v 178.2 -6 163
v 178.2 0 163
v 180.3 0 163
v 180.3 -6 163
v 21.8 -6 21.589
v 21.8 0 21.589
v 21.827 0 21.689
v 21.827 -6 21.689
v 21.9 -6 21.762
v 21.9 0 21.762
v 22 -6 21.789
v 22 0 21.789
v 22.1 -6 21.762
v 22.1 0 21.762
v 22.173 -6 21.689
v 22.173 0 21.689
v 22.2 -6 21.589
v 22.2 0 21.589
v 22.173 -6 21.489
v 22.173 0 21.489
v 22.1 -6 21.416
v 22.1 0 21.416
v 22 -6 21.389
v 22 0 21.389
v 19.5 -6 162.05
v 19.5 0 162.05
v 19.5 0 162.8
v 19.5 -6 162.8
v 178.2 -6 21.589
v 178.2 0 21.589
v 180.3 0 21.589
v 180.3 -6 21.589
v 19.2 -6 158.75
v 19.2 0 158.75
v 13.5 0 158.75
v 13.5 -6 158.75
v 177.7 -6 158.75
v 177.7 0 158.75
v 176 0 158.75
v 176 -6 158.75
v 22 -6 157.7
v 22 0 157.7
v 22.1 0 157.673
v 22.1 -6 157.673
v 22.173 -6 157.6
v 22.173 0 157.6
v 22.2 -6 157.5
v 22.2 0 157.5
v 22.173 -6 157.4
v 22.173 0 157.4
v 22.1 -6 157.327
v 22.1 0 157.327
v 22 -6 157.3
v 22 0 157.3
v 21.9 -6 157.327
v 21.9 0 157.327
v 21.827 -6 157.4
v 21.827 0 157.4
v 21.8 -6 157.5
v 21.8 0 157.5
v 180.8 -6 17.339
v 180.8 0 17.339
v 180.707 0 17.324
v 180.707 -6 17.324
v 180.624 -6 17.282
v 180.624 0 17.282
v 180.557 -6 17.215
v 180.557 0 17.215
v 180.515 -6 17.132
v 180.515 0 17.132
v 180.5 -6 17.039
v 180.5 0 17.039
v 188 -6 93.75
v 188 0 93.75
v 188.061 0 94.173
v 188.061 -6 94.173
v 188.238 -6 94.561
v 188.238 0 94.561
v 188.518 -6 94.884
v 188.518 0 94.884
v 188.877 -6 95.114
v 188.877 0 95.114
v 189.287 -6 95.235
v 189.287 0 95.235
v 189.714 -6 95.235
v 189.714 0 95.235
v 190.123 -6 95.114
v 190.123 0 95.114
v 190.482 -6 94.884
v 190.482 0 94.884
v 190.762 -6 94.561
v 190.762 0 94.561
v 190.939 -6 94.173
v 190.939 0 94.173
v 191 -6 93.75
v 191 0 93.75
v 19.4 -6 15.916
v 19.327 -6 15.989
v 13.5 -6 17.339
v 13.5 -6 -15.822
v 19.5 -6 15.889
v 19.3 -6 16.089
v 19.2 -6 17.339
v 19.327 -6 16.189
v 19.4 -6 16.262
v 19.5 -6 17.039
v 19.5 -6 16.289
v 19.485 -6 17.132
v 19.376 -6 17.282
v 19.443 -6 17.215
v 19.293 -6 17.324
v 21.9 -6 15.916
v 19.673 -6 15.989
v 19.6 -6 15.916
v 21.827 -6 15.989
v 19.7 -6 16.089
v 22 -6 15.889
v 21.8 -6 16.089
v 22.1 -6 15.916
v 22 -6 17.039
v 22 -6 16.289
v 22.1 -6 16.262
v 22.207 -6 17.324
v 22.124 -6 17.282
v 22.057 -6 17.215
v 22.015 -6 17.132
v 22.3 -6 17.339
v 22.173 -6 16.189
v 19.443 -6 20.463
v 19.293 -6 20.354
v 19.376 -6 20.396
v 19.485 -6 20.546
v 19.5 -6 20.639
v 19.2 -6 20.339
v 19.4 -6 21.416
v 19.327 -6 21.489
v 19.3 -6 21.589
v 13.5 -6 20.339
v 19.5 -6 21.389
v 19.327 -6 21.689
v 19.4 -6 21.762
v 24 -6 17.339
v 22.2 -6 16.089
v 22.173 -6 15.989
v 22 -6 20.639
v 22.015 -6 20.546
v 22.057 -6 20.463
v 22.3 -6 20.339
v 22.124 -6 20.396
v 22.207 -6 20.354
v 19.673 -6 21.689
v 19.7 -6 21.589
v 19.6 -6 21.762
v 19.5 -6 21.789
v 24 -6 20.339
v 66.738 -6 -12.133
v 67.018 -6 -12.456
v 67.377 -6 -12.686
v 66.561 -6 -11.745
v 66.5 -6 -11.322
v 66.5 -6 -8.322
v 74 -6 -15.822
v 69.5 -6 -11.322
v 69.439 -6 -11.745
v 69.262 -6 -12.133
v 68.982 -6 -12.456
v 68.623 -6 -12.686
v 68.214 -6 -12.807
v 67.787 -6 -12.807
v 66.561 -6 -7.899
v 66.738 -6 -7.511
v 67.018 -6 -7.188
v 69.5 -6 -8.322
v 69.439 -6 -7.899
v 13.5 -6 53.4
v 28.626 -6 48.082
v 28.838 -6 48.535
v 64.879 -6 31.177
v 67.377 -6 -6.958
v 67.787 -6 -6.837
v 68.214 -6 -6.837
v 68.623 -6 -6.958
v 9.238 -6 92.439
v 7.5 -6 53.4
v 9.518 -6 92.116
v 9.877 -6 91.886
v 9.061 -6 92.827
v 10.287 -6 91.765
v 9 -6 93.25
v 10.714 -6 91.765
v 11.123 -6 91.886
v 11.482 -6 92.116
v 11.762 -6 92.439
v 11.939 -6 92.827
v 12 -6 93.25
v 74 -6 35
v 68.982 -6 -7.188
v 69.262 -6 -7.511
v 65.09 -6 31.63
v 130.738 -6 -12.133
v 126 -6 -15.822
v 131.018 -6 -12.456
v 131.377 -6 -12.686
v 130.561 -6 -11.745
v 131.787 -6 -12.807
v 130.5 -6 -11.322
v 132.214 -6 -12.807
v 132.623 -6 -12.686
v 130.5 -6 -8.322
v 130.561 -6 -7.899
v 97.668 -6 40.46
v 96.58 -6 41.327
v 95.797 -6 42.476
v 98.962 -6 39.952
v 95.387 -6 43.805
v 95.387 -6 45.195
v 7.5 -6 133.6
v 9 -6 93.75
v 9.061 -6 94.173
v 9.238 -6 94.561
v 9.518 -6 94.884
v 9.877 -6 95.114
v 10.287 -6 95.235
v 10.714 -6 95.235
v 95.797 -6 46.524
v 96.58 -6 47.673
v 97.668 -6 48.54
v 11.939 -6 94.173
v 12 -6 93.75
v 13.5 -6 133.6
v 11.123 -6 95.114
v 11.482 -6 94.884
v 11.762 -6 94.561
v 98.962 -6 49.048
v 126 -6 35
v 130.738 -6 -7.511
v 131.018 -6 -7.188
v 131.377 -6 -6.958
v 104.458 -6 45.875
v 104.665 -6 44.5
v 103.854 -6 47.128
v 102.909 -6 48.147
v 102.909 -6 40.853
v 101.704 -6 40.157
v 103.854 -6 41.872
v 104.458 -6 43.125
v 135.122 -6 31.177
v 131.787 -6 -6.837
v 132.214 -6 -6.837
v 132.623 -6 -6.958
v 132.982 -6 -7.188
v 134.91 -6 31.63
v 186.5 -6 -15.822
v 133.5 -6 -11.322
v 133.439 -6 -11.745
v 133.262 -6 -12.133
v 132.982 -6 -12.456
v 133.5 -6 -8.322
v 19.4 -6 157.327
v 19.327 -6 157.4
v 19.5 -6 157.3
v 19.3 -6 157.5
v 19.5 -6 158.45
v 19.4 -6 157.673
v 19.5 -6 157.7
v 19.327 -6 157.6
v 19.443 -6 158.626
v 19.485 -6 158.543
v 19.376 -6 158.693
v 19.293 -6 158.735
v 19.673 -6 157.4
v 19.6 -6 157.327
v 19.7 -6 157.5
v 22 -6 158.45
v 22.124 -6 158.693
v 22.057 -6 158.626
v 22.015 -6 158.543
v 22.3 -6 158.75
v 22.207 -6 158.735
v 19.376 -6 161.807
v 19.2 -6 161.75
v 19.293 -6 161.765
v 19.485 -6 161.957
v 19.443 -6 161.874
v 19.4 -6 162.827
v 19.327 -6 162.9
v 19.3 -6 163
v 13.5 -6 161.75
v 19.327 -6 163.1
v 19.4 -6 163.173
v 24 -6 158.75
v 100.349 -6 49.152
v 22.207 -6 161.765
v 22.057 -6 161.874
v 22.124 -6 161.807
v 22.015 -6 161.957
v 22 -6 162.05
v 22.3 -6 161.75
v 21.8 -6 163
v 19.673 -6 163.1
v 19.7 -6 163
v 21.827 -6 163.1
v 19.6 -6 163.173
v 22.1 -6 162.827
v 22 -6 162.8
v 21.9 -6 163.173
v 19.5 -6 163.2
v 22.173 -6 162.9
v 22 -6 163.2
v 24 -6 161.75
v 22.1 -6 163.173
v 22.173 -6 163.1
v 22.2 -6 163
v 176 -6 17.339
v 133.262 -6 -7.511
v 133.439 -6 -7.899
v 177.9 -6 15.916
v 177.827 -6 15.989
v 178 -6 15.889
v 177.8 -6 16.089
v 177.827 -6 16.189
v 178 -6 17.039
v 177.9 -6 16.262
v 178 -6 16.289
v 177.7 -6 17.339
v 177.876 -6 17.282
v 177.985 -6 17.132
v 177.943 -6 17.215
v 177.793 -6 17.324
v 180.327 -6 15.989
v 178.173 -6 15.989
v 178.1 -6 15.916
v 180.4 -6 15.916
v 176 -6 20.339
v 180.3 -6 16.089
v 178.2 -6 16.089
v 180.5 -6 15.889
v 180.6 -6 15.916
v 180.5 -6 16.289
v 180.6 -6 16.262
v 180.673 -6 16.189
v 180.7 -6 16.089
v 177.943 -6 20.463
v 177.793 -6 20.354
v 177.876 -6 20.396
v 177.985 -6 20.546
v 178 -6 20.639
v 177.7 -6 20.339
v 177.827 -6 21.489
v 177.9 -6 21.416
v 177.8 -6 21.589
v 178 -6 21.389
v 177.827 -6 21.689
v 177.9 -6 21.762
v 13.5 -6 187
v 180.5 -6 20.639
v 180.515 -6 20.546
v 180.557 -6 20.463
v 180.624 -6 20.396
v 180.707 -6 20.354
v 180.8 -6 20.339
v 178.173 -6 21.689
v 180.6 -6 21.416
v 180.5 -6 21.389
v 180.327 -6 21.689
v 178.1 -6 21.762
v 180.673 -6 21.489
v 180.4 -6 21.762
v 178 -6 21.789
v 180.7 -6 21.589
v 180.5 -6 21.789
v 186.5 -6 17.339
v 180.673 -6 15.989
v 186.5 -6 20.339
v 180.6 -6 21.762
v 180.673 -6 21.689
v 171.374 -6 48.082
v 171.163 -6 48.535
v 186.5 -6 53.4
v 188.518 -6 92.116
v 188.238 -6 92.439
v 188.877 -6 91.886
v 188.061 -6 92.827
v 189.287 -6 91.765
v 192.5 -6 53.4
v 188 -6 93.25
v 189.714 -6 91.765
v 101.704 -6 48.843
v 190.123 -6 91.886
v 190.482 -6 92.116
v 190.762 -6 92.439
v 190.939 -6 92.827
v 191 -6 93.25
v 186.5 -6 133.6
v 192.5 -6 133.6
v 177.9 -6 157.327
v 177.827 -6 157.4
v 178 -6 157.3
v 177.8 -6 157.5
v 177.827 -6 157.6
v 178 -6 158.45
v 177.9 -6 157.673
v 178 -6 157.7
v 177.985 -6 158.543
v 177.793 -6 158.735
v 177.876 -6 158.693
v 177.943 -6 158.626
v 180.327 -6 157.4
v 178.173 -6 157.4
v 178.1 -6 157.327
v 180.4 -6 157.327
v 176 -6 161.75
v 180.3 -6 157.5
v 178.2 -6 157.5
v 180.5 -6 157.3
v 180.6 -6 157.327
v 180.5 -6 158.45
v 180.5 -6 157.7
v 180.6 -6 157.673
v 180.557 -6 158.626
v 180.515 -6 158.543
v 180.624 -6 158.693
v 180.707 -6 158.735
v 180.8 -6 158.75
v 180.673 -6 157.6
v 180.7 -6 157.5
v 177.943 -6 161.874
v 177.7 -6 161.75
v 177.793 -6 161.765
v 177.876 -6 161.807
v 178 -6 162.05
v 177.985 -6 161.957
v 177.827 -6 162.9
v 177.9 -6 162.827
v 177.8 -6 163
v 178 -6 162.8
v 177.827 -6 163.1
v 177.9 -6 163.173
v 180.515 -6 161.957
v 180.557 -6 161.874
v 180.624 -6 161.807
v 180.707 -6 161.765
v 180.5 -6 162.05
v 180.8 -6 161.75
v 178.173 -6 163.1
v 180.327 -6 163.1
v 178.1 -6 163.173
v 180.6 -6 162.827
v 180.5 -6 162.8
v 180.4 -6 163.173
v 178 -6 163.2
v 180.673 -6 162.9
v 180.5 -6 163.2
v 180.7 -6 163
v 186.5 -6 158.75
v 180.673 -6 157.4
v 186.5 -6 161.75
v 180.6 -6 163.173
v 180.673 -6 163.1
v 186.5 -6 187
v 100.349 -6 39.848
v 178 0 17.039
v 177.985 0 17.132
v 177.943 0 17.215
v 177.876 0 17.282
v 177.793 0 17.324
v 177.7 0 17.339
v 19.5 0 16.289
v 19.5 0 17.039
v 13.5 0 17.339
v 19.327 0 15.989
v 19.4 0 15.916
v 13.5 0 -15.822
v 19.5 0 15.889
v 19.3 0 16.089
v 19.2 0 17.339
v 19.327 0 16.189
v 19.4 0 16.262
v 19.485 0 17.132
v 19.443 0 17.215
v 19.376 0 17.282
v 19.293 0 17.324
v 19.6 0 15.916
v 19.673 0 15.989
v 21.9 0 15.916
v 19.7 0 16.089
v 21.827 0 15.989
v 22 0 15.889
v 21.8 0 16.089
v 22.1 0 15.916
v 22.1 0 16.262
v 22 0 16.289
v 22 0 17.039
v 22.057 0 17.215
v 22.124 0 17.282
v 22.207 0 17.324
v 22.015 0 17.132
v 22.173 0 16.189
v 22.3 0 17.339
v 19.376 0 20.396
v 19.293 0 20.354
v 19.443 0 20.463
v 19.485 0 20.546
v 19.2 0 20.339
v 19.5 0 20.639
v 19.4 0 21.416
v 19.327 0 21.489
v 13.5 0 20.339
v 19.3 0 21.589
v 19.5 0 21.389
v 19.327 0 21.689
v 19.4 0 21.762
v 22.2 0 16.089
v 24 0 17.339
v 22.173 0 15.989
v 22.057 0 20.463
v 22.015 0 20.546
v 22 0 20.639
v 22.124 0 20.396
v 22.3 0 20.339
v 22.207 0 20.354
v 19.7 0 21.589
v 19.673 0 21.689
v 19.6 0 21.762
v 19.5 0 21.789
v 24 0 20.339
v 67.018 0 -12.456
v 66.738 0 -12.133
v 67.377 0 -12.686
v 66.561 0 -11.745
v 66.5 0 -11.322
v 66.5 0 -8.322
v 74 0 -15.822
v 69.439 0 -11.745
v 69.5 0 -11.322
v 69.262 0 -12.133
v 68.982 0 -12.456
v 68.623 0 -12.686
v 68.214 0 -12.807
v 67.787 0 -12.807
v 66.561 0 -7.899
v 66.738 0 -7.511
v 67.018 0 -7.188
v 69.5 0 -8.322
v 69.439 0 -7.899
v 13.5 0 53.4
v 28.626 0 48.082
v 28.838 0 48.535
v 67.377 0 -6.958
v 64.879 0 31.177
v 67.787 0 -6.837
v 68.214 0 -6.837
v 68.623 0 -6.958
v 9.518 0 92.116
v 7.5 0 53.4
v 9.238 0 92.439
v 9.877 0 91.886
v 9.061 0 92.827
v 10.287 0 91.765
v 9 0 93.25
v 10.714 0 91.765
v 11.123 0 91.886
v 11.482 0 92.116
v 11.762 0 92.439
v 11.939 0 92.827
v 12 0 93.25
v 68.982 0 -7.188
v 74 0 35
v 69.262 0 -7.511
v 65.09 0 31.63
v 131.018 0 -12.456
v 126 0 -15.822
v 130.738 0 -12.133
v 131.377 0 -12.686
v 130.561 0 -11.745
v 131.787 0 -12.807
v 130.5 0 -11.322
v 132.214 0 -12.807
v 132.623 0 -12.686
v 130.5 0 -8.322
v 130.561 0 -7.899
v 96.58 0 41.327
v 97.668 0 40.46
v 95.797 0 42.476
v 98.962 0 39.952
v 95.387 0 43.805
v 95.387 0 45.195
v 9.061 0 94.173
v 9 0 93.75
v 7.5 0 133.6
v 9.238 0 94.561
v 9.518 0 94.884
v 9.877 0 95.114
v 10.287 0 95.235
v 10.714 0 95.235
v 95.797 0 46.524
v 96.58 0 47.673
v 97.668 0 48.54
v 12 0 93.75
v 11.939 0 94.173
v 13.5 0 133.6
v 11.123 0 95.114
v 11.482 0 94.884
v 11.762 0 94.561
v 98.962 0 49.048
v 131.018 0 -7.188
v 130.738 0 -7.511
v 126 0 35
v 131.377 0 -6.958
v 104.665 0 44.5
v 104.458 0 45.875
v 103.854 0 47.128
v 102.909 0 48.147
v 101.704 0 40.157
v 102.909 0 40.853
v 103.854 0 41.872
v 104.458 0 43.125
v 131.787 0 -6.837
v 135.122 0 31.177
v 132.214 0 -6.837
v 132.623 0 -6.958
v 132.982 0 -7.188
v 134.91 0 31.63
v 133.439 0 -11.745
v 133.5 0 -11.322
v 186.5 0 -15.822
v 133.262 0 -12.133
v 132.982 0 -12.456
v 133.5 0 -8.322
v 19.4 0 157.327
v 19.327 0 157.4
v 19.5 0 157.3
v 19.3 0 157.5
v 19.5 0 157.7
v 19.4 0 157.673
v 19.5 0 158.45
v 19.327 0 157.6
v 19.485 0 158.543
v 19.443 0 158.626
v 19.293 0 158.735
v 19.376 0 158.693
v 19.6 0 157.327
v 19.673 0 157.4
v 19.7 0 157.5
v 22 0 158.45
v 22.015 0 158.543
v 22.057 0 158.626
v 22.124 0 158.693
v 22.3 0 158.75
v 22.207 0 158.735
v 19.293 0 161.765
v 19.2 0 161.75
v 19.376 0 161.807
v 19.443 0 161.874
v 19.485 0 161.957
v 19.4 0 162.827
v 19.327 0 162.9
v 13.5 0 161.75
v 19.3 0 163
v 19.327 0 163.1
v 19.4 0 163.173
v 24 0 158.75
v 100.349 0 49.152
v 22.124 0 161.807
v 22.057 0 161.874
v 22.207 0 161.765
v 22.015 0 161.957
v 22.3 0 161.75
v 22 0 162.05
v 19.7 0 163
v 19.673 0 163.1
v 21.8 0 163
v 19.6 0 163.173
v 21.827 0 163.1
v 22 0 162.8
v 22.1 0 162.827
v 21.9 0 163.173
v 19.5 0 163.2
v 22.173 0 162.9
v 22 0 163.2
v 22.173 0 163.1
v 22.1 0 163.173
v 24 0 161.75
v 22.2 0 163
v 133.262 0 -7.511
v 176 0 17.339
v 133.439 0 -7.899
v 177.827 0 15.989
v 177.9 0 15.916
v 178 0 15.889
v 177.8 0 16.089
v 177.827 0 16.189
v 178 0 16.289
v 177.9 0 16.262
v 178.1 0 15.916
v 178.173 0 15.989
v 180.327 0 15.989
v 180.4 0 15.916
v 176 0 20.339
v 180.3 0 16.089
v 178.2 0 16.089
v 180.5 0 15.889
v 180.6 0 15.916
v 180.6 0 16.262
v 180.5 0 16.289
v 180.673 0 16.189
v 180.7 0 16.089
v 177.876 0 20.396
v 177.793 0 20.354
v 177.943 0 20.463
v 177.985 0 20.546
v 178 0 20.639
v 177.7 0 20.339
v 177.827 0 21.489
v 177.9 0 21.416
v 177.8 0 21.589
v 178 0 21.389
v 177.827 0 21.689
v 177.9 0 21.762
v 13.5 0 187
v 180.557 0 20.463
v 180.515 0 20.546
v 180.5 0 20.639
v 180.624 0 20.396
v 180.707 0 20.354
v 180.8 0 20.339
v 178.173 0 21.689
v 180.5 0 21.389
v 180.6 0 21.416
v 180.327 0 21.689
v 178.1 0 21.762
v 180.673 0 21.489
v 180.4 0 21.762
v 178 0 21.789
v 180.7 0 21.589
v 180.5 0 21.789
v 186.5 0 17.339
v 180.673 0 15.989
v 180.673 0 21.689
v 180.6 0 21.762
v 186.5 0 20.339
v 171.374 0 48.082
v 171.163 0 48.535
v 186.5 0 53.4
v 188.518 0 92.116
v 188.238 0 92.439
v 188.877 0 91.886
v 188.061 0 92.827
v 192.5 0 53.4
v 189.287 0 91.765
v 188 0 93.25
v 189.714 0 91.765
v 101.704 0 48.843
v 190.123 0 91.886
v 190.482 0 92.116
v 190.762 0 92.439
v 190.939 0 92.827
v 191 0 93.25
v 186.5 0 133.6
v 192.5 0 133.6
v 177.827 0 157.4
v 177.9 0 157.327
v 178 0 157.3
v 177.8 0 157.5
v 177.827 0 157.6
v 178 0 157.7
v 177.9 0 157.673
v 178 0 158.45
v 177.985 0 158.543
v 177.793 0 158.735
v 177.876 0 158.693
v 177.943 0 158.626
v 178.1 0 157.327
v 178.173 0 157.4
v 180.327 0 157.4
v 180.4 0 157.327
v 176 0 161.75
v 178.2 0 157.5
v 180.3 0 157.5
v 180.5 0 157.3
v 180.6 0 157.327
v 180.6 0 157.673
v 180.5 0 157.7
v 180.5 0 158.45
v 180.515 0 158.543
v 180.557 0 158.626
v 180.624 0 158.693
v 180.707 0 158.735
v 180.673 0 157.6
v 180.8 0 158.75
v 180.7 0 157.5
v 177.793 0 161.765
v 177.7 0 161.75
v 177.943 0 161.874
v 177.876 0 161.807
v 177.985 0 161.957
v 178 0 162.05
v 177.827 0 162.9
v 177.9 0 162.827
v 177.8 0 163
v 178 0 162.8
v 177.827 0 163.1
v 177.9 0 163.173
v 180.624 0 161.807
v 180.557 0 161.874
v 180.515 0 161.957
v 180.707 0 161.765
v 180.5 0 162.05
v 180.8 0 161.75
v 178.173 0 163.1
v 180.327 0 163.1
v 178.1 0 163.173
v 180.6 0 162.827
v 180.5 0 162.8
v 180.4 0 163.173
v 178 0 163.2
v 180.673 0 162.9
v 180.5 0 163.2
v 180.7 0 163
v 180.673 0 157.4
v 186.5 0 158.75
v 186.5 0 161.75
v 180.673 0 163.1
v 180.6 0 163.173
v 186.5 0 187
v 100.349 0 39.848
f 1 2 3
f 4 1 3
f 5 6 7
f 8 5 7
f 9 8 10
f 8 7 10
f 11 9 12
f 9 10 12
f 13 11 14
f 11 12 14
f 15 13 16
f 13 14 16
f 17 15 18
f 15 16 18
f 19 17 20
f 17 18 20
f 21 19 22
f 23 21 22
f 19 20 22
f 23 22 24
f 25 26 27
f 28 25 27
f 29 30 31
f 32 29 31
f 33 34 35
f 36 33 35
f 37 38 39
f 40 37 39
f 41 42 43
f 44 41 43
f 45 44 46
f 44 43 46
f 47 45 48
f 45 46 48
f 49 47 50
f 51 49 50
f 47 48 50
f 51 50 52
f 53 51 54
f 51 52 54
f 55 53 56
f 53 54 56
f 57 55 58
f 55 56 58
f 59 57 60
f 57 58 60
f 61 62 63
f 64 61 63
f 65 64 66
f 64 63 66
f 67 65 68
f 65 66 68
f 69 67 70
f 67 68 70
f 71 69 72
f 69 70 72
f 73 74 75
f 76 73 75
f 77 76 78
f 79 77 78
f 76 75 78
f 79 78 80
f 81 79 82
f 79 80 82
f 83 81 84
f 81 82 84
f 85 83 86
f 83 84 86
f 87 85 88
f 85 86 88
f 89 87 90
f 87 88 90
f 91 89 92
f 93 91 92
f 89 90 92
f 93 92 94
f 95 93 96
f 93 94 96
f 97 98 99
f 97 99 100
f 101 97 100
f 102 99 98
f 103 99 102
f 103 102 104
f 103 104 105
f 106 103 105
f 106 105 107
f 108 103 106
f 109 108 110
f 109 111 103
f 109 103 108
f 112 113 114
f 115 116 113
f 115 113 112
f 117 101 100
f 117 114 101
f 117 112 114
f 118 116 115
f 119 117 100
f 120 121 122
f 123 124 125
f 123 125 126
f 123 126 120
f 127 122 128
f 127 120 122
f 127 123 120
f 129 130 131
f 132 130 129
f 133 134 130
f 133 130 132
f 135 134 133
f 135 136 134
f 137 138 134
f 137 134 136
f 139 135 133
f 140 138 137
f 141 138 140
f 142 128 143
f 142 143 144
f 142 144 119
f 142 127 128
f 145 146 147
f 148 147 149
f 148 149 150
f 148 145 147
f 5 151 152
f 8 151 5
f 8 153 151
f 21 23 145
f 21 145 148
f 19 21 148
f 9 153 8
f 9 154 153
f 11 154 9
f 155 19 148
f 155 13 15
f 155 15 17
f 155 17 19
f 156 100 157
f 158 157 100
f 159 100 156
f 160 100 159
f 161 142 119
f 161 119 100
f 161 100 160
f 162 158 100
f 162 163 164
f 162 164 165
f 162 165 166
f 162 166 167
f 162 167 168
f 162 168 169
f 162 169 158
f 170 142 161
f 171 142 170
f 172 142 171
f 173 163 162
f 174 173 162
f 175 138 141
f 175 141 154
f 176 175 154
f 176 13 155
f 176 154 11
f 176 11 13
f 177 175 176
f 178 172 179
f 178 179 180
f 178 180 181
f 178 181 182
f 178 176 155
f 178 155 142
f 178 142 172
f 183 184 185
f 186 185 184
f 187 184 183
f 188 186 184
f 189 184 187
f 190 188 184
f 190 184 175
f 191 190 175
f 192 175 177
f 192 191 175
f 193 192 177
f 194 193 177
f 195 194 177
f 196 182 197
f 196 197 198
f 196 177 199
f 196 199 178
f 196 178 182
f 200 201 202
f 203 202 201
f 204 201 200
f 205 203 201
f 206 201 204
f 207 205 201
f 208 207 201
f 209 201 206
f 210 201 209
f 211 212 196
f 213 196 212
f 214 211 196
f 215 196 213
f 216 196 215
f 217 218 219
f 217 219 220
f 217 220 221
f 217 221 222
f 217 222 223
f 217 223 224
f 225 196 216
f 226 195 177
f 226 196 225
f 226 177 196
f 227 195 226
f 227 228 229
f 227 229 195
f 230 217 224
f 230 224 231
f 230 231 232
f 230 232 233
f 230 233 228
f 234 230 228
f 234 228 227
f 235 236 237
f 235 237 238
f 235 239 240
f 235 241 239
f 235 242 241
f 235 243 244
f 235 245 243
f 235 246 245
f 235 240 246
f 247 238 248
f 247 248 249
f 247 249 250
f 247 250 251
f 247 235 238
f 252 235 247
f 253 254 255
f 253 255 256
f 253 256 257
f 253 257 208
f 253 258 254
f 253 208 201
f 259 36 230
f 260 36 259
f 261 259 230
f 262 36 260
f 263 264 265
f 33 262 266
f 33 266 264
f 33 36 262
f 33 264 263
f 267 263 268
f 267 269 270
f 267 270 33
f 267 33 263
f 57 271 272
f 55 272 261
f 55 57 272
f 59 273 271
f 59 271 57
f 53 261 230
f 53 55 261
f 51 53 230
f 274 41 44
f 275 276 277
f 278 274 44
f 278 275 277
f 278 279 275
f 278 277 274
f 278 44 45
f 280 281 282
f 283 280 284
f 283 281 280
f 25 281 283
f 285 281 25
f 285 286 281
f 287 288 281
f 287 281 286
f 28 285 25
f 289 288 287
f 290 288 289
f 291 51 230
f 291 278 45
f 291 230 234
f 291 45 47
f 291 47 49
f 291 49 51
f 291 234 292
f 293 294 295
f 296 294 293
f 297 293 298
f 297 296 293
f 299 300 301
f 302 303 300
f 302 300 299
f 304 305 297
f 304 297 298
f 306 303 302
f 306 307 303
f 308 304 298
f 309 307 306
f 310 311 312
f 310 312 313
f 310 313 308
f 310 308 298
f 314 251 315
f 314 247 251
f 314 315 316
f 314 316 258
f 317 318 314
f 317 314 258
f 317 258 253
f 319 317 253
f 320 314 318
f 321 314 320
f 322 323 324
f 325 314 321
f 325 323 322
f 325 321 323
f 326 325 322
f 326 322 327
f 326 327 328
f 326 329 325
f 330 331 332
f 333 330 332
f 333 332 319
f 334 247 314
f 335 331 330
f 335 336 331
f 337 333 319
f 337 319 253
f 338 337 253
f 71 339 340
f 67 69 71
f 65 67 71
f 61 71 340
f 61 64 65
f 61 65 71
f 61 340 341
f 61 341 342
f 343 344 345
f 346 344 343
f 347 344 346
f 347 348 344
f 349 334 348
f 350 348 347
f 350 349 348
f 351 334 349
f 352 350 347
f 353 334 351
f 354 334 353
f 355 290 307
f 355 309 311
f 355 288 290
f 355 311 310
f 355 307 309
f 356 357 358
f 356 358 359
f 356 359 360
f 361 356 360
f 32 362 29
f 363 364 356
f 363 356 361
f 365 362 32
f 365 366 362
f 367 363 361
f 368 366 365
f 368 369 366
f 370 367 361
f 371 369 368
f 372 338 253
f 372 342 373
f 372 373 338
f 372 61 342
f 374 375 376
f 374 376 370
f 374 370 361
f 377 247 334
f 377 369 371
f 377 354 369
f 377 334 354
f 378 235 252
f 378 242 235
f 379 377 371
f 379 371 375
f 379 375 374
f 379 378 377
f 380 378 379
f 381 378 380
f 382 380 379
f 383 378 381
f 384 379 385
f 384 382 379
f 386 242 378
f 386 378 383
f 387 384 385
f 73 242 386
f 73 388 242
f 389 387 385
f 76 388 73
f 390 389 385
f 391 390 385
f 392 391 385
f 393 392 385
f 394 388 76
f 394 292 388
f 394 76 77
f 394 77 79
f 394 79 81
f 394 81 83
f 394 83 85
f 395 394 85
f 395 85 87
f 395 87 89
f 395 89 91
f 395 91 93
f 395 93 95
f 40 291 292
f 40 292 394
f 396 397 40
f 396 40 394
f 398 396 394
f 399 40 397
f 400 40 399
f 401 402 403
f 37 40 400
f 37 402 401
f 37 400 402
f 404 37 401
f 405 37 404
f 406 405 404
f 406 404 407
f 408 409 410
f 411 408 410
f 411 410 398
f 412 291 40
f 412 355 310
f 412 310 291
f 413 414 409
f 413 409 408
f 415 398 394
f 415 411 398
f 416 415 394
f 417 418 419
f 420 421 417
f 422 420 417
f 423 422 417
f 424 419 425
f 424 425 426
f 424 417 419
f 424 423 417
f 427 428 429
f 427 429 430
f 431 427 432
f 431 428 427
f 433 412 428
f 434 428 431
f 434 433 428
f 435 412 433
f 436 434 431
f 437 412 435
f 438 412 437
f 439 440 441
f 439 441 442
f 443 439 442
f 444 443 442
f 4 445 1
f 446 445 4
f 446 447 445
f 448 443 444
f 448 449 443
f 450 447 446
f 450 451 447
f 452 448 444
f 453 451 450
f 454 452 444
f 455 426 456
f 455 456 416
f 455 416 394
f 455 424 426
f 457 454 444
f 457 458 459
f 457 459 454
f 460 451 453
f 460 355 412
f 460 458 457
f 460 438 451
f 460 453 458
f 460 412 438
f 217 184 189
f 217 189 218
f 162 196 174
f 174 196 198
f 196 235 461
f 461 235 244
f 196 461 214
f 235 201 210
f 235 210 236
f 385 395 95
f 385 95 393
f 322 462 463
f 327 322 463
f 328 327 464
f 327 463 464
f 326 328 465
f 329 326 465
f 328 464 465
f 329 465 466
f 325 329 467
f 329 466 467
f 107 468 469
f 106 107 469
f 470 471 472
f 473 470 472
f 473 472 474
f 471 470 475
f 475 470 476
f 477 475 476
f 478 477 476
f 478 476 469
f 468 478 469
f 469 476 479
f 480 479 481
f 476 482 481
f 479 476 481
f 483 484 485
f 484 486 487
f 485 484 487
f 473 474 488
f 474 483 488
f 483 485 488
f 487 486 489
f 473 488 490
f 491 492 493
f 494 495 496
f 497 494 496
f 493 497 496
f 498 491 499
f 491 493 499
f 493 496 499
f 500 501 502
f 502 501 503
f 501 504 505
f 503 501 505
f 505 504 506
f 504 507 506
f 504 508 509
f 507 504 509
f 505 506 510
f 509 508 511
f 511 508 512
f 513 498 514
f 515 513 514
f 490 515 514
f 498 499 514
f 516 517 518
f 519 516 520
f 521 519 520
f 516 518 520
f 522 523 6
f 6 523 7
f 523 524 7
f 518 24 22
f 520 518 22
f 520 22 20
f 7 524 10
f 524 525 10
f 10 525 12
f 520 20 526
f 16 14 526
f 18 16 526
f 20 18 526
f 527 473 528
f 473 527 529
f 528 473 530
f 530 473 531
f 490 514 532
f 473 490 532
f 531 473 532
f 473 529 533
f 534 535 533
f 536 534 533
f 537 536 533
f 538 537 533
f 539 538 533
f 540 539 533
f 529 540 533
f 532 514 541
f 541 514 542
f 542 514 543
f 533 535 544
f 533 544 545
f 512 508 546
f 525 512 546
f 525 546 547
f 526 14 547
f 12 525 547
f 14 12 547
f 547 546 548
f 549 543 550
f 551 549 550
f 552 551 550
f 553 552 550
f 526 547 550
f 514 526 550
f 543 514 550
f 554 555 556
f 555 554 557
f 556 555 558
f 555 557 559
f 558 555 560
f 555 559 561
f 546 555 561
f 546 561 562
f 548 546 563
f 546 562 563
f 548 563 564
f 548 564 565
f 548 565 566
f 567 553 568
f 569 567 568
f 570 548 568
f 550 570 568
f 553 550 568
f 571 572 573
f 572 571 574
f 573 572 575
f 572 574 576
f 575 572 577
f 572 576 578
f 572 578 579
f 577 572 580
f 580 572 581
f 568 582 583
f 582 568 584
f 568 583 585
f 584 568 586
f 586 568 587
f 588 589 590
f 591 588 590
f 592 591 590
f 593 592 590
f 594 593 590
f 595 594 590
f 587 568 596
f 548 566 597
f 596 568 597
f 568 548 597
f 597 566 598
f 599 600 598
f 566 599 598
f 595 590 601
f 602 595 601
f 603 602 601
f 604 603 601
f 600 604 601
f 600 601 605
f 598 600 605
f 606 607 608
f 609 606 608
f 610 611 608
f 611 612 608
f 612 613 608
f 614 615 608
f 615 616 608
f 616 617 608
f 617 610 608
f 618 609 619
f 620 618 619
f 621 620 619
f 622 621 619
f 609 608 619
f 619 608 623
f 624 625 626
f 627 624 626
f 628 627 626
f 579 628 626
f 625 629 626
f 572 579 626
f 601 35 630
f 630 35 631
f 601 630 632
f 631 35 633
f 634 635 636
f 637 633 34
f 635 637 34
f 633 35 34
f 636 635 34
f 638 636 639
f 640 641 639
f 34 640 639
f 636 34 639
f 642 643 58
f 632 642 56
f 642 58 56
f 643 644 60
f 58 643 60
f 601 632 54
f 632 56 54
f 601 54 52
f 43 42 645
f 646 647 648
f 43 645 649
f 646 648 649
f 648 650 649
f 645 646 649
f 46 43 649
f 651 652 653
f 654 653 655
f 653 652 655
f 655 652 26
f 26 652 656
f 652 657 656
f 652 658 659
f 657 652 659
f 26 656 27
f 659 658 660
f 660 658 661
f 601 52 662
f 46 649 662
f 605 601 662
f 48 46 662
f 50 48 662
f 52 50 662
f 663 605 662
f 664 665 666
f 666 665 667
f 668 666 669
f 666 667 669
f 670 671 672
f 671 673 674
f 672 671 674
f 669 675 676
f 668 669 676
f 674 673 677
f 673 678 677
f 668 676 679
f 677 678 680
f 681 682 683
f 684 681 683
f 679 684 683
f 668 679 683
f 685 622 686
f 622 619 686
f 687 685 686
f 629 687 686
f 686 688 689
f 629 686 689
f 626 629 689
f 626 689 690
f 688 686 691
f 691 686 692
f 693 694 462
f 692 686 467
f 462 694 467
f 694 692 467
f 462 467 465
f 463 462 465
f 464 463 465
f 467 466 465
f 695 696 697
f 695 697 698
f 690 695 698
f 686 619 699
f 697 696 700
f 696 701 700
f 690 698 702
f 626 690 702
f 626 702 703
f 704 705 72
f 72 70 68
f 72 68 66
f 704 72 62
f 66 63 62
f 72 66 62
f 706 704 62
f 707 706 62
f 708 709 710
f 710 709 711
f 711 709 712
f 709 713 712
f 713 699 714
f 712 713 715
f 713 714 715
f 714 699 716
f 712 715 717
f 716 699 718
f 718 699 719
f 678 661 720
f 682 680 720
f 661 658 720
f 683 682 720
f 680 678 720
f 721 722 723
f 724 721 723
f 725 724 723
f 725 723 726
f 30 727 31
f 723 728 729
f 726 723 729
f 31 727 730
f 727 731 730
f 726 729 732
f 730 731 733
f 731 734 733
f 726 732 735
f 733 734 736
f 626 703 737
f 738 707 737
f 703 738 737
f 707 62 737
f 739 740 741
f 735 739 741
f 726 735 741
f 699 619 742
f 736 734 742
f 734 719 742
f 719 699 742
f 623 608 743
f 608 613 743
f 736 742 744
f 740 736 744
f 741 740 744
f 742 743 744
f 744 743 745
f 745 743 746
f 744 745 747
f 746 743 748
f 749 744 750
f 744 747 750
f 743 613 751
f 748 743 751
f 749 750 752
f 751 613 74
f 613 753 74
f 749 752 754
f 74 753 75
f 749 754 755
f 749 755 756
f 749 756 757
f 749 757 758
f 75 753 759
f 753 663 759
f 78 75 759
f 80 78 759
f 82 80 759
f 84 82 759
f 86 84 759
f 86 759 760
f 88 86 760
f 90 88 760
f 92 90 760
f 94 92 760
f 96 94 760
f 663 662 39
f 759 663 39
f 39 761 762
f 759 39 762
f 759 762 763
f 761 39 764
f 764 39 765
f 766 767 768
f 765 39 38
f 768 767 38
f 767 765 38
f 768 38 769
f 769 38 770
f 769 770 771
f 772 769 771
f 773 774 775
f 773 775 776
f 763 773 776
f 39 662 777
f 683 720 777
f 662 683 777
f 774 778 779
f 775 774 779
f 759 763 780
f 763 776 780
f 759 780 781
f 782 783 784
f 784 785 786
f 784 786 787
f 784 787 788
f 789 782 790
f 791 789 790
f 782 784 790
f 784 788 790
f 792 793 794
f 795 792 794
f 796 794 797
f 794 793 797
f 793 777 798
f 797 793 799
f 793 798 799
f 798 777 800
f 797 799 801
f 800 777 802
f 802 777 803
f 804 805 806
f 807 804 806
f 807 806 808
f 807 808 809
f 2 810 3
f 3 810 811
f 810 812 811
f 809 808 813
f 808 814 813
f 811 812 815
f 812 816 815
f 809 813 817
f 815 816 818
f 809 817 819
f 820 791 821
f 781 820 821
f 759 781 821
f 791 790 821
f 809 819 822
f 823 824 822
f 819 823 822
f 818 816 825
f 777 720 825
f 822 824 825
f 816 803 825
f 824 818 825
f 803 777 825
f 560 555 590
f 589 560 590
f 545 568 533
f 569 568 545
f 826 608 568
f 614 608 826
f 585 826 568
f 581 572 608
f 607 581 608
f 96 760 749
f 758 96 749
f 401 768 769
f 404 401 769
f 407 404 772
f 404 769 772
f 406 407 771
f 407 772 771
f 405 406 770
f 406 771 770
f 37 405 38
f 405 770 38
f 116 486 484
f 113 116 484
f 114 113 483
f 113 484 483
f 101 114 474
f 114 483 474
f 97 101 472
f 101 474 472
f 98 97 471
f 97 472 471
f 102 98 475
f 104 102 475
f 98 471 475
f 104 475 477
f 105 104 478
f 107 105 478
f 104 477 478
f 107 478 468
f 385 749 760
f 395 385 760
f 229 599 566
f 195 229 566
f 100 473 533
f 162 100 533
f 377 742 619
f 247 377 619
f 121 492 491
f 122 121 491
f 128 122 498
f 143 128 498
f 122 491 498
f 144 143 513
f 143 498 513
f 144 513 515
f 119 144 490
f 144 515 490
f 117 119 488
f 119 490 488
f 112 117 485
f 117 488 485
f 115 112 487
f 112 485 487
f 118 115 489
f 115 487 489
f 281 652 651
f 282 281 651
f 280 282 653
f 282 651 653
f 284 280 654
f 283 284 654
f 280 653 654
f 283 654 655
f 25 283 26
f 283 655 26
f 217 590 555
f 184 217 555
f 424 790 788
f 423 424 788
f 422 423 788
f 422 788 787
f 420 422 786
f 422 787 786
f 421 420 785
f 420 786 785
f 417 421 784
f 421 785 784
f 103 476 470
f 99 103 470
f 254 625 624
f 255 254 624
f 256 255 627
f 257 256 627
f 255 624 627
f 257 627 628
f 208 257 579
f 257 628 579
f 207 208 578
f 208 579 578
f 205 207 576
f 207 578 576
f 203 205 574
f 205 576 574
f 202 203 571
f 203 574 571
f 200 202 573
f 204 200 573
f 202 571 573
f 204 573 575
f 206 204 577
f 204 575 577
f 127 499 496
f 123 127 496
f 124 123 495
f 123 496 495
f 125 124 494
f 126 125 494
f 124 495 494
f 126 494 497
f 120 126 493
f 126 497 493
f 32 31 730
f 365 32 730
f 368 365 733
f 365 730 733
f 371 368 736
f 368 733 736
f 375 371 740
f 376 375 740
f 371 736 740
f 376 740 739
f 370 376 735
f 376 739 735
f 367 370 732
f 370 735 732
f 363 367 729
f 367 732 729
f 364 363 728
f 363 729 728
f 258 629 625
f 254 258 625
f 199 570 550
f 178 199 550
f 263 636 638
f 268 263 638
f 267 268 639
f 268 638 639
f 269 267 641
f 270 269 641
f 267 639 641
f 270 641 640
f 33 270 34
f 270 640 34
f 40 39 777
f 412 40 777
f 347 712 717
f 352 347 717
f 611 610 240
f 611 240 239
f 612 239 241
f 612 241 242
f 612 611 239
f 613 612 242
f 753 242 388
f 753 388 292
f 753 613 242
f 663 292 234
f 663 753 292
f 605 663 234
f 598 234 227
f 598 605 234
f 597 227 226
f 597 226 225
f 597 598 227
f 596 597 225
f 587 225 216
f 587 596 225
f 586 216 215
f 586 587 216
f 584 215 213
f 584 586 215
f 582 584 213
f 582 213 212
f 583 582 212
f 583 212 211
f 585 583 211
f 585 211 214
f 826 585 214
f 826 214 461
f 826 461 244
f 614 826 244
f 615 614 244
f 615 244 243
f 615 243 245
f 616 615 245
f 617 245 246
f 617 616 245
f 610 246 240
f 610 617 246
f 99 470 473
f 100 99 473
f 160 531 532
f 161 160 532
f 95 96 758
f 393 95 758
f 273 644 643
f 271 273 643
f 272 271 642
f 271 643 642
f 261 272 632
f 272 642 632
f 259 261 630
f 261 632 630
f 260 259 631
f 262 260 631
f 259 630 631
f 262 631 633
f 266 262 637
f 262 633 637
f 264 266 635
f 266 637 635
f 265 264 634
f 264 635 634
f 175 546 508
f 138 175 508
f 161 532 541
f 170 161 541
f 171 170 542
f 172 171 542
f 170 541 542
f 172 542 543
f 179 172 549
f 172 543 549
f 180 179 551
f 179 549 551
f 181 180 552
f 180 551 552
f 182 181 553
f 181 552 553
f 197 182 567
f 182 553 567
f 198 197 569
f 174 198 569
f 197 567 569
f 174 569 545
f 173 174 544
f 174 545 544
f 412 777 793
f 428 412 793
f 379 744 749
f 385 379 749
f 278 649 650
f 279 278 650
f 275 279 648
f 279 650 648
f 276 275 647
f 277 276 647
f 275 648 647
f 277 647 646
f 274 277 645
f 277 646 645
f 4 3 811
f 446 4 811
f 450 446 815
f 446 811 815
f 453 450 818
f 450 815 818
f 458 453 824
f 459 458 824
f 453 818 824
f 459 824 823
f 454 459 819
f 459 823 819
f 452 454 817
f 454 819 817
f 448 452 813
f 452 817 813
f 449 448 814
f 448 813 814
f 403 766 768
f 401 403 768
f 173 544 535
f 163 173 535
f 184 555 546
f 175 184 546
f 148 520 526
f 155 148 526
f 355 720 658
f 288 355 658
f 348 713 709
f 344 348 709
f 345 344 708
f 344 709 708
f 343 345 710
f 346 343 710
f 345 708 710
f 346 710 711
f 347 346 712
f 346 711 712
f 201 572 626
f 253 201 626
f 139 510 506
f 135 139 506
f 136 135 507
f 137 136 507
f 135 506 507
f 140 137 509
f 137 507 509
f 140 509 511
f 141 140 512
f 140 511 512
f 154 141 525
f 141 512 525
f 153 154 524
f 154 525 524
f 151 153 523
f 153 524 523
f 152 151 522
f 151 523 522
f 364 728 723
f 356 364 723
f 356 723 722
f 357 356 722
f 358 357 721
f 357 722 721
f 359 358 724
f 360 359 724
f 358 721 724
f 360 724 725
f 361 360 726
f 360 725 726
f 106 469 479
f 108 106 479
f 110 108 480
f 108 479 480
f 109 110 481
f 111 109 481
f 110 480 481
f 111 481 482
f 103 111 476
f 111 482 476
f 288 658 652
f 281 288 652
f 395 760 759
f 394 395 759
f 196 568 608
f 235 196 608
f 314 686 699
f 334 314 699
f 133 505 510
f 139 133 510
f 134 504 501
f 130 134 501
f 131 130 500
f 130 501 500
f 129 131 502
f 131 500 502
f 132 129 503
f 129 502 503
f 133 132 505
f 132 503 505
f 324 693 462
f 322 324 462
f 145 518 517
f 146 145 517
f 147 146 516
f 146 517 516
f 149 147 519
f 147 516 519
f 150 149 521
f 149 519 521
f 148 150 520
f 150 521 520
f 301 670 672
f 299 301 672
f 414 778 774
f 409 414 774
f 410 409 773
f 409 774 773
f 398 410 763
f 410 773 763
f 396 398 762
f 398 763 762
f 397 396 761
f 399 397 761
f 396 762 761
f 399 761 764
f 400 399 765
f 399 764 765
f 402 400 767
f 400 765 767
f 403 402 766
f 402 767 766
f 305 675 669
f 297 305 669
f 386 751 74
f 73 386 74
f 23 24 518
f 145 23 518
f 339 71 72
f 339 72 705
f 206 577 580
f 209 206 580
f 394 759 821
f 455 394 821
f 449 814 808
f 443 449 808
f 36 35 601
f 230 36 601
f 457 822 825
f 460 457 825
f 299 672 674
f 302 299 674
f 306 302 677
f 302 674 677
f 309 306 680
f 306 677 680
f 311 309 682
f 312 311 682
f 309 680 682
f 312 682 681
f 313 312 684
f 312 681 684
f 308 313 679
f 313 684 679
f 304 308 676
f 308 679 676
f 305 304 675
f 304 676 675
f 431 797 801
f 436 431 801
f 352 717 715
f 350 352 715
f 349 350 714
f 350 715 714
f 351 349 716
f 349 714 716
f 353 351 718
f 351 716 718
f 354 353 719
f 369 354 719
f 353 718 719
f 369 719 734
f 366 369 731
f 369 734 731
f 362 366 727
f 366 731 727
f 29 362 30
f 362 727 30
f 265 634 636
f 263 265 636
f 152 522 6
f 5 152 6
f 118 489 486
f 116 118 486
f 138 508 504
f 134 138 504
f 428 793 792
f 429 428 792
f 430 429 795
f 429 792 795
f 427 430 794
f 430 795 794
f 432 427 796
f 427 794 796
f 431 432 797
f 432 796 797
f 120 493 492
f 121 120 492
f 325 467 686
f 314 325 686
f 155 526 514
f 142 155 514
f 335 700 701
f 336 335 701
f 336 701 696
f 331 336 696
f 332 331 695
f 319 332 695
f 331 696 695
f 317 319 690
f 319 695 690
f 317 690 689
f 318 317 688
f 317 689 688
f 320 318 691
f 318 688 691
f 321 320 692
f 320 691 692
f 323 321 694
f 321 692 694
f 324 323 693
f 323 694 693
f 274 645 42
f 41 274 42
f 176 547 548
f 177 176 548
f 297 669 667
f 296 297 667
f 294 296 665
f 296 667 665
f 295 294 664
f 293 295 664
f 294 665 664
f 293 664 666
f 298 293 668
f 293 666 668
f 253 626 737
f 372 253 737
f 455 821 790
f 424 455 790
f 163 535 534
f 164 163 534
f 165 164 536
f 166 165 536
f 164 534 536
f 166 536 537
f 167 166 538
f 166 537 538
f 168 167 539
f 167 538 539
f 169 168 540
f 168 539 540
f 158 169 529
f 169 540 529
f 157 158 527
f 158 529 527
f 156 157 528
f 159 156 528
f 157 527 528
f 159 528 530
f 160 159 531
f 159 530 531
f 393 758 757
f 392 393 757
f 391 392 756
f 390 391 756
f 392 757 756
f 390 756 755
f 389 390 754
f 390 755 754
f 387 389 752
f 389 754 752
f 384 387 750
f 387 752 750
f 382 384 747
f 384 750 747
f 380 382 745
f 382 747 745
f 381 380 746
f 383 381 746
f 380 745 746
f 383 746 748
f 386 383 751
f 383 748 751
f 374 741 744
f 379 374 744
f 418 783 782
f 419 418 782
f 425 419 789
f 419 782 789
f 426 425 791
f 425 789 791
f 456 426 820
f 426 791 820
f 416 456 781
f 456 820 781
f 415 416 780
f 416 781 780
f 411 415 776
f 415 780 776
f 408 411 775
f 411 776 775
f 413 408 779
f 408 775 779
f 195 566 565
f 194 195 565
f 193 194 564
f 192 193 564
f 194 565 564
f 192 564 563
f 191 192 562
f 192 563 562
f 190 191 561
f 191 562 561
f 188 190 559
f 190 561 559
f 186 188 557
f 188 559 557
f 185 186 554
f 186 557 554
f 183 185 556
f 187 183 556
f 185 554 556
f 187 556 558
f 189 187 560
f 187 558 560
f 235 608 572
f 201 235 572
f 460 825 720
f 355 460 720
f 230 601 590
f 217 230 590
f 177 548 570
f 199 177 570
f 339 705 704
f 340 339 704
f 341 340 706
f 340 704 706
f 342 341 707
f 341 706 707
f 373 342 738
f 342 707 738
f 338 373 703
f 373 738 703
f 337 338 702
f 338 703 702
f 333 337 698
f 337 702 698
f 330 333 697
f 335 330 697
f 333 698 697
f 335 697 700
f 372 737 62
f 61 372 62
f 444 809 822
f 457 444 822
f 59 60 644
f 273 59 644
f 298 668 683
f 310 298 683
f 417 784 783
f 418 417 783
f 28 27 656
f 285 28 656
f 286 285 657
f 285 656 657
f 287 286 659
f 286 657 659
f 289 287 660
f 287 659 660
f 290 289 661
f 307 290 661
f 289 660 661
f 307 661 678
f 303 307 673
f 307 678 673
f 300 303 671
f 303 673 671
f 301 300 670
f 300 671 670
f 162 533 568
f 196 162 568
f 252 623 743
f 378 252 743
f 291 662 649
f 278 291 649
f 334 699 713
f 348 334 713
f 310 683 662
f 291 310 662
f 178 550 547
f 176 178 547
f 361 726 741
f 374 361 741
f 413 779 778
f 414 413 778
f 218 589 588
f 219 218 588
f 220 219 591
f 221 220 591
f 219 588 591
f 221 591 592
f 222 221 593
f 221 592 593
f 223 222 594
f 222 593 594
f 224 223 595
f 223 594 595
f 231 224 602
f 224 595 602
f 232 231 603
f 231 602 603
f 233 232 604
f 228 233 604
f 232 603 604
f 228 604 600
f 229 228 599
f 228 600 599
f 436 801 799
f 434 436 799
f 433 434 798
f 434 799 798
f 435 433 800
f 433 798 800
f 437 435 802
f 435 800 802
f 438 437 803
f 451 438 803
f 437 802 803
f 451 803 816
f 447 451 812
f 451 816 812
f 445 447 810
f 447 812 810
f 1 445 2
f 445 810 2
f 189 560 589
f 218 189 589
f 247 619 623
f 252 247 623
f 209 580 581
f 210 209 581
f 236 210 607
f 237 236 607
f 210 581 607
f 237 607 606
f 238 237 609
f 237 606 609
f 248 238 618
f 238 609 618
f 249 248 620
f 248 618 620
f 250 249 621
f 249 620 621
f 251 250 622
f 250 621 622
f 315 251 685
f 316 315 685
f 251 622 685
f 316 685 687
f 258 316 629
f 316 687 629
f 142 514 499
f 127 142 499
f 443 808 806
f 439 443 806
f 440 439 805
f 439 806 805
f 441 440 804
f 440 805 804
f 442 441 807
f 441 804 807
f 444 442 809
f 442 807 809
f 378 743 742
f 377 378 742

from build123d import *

# Parameters (mm, degrees)
F0_R     = 4.665
F1_DEPTH = 6


with BuildPart() as f1:
    # F0 (on Front) → F1 (new body)
    with BuildSketch(Plane.XZ):
        with BuildLine():
            Line((186.500065, 187), (13.500065, 187))
            Line((13.500065, 187), (13.500065, 161.75))
            Line((13.500065, 161.75), (19.200065, 161.75))
            ThreePointArc((19.200065, 161.75), (19.412197, 161.837868), (19.500065, 162.05))
            Line((19.500065, 162.05), (19.500065, 162.8))
            ThreePointArc((19.500065, 162.8), (19.358643, 163.141421), (19.700065, 163))
            Line((19.700065, 163), (21.800065, 163))
            ThreePointArc((21.800065, 163), (22.141486, 163.141421), (22.000065, 162.8))
            Line((22.000065, 162.8), (22.000065, 162.05))
            ThreePointArc((22.000065, 162.05), (22.087933, 161.837868), (22.300065, 161.75))
            Line((22.300065, 161.75), (24.000065, 161.75))
            Line((24.000065, 161.75), (24.000065, 158.75))
            Line((24.000065, 158.75), (22.300065, 158.75))
            ThreePointArc((22.300065, 158.75), (22.087933, 158.662132), (22.000065, 158.45))
            Line((22.000065, 158.45), (22.000065, 157.7))
            ThreePointArc((22.000065, 157.7), (22.141486, 157.358579), (21.800065, 157.5))
            Line((21.800065, 157.5), (19.700065, 157.5))
            ThreePointArc((19.700065, 157.5), (19.358643, 157.358579), (19.500065, 157.7))
            Line((19.500065, 157.7), (19.500065, 158.45))
            ThreePointArc((19.500065, 158.45), (19.412197, 158.662132), (19.200065, 158.75))
            Line((19.200065, 158.75), (13.500065, 158.75))
            Line((13.500065, 158.75), (13.500065, 133.6))
            Line((13.500065, 133.6), (7.500065, 133.6))
            Line((7.500065, 133.6), (7.500065, 133.5))
            Line((7.500065, 133.5), (7.500065, 53.5))
            Line((7.500065, 53.5), (7.500065, 53.4))
            Line((7.500065, 53.4), (13.500109, 53.4))
            Line((13.500109, 53.4), (13.500072, 20.339))
            Line((13.500072, 20.339), (19.200072, 20.339))
            ThreePointArc((19.200072, 20.339), (19.412204, 20.426868), (19.500072, 20.639))
            Line((19.500072, 20.639), (19.500072, 21.389))
            ThreePointArc((19.500072, 21.389), (19.35865, 21.730421), (19.700072, 21.589))
            Line((19.700072, 21.589), (21.800072, 21.589))
            ThreePointArc((21.800072, 21.589), (22.141493, 21.730421), (22.000072, 21.389))
            Line((22.000072, 21.389), (22.000072, 20.639))
            ThreePointArc((22.000072, 20.639), (22.08794, 20.426868), (22.300072, 20.339))
            Line((22.300072, 20.339), (24.000068, 20.339))
            Line((24.000068, 20.339), (24.000068, 17.339))
            Line((24.000068, 17.339), (22.300068, 17.339))
            ThreePointArc((22.300068, 17.339), (22.087936, 17.251132), (22.000068, 17.039))
            Line((22.000068, 17.039), (22.000068, 16.289))
            ThreePointArc((22.000068, 16.289), (22.14149, 15.947579), (21.800068, 16.089))
            Line((21.800068, 16.089), (19.700068, 16.089))
            ThreePointArc((19.700068, 16.089), (19.358647, 15.947579), (19.500068, 16.289))
            Line((19.500068, 16.289), (19.500068, 17.039))
            ThreePointArc((19.500068, 17.039), (19.4122, 17.251132), (19.200068, 17.339))
            Line((19.200068, 17.339), (13.500068, 17.339))
            Line((13.500068, 17.339), (13.500031, -15.822))
            Line((13.500031, -15.822), (74.000065, -15.822))
            Line((74.000065, -15.822), (74.000065, 0))
            Line((74.000065, 0), (74.000065, 35))
            Line((74.000065, 35), (126.000065, 35))
            Line((126.000065, 35), (126.000065, 0))
            Line((126.000065, 0), (126.000065, -15.822))
            Line((126.000065, -15.822), (186.500098, -15.822))
            Line((186.500098, -15.822), (186.500061, 17.339))
            Line((186.500061, 17.339), (180.800061, 17.339))
            ThreePointArc((180.800061, 17.339), (180.587929, 17.251132), (180.500061, 17.039))
            Line((180.500061, 17.039), (180.500061, 16.289))
            ThreePointArc((180.500061, 16.289), (180.641482, 15.947579), (180.300061, 16.089))
            Line((180.300061, 16.089), (178.200058, 16.089))
            ThreePointArc((178.200058, 16.089), (177.858636, 15.947579), (178.000058, 16.289))
            Line((178.000058, 16.289), (178.000058, 17.039))
            ThreePointArc((178.000058, 17.039), (177.91219, 17.251132), (177.700058, 17.339))
            Line((177.700058, 17.339), (176.000058, 17.339))
            Line((176.000058, 17.339), (176.000058, 20.339))
            Line((176.000058, 20.339), (177.700058, 20.339))
            ThreePointArc((177.700058, 20.339), (177.91219, 20.426868), (178.000058, 20.639))
            Line((178.000058, 20.639), (178.000058, 21.389))
            ThreePointArc((178.000058, 21.389), (177.858636, 21.730421), (178.200058, 21.589))
            Line((178.200058, 21.589), (180.300058, 21.589))
            ThreePointArc((180.300058, 21.589), (180.641479, 21.730421), (180.500058, 21.389))
            Line((180.500058, 21.389), (180.500058, 20.639))
            ThreePointArc((180.500058, 20.639), (180.587926, 20.426868), (180.800058, 20.339))
            Line((180.800058, 20.339), (186.500058, 20.339))
            Line((186.500058, 20.339), (186.500021, 53.4))
            Line((186.500021, 53.4), (192.500065, 53.4))
            Line((192.500065, 53.4), (192.500065, 53.5))
            Line((192.500065, 53.5), (192.500065, 133.5))
            Line((192.500065, 133.5), (192.500065, 133.6))
            Line((192.500065, 133.6), (186.500065, 133.6))
            Line((186.500065, 133.6), (186.500065, 158.75))
            Line((186.500065, 158.75), (180.800058, 158.75))
            ThreePointArc((180.800058, 158.75), (180.587926, 158.662132), (180.500058, 158.45))
            Line((180.500058, 158.45), (180.500058, 157.7))
            ThreePointArc((180.500058, 157.7), (180.641479, 157.358579), (180.300058, 157.5))
            Line((180.300058, 157.5), (178.200058, 157.5))
            ThreePointArc((178.200058, 157.5), (177.858636, 157.358579), (178.000058, 157.7))
            Line((178.000058, 157.7), (178.000058, 158.45))
            ThreePointArc((178.000058, 158.45), (177.91219, 158.662132), (177.700058, 158.75))
            Line((177.700058, 158.75), (176.000058, 158.75))
            Line((176.000058, 158.75), (176.000058, 161.75))
            Line((176.000058, 161.75), (177.700058, 161.75))
            ThreePointArc((177.700058, 161.75), (177.91219, 161.837868), (178.000058, 162.05))
            Line((178.000058, 162.05), (178.000058, 162.8))
            ThreePointArc((178.000058, 162.8), (177.858636, 163.141421), (178.200058, 163))
            Line((178.200058, 163), (180.300065, 163))
            ThreePointArc((180.300065, 163), (180.641486, 163.141421), (180.500065, 162.8))
            Line((180.500065, 162.8), (180.500065, 162.05))
            ThreePointArc((180.500065, 162.05), (180.587933, 161.837868), (180.800065, 161.75))
            Line((180.800065, 161.75), (186.500065, 161.75))
            Line((186.500065, 161.75), (186.500065, 187))
        make_face()
        with BuildLine():
            Line((66.500065, -11.322), (66.500065, -8.322))
            ThreePointArc((66.500065, -8.322), (68.000065, -6.822), (69.500065, -8.322))
            Line((69.500065, -8.322), (69.500065, -11.322))
            ThreePointArc((69.500065, -11.322), (68.000065, -12.822), (66.500065, -11.322))
        make_face(mode=Mode.SUBTRACT)
        Polygon((28.62622, 48.081567), (28.837529, 48.534721), (65.08984, 31.629991), (64.878531, 31.176837), align=None, mode=Mode.SUBTRACT)
        with BuildLine():
            Line((130.500065, -11.322), (130.500065, -8.322))
            ThreePointArc((130.500065, -8.322), (132.000065, -6.822), (133.500065, -8.322))
            Line((133.500065, -8.322), (133.500065, -11.322))
            ThreePointArc((133.500065, -11.322), (132.000065, -12.822), (130.500065, -11.322))
        make_face(mode=Mode.SUBTRACT)
        with Locations((100.000065, 44.5)):
            Circle(F0_R, mode=Mode.SUBTRACT)
        Polygon((135.121598, 31.176837), (134.910289, 31.629991), (171.1626, 48.534721), (171.37391, 48.081567), align=None, mode=Mode.SUBTRACT)
        with BuildLine():
            ThreePointArc((9.000065, 93.75), (10.500065, 95.25), (12.000065, 93.75))
            Line((12.000065, 93.75), (12.000065, 93.25))
            ThreePointArc((12.000065, 93.25), (10.500065, 91.75), (9.000065, 93.25))
            Line((9.000065, 93.25), (9.000065, 93.75))
        make_face(mode=Mode.SUBTRACT)
        with BuildLine():
            Line((191.000064, 93.75), (191.000064, 93.25))
            ThreePointArc((191.000064, 93.25), (189.500064, 91.75), (188.000064, 93.25))
            Line((188.000064, 93.25), (188.000064, 93.75))
            ThreePointArc((188.000064, 93.75), (189.500064, 95.25), (191.000064, 93.75))
        make_face(mode=Mode.SUBTRACT)
    extrude(amount=F1_DEPTH)


solid = f1.part
